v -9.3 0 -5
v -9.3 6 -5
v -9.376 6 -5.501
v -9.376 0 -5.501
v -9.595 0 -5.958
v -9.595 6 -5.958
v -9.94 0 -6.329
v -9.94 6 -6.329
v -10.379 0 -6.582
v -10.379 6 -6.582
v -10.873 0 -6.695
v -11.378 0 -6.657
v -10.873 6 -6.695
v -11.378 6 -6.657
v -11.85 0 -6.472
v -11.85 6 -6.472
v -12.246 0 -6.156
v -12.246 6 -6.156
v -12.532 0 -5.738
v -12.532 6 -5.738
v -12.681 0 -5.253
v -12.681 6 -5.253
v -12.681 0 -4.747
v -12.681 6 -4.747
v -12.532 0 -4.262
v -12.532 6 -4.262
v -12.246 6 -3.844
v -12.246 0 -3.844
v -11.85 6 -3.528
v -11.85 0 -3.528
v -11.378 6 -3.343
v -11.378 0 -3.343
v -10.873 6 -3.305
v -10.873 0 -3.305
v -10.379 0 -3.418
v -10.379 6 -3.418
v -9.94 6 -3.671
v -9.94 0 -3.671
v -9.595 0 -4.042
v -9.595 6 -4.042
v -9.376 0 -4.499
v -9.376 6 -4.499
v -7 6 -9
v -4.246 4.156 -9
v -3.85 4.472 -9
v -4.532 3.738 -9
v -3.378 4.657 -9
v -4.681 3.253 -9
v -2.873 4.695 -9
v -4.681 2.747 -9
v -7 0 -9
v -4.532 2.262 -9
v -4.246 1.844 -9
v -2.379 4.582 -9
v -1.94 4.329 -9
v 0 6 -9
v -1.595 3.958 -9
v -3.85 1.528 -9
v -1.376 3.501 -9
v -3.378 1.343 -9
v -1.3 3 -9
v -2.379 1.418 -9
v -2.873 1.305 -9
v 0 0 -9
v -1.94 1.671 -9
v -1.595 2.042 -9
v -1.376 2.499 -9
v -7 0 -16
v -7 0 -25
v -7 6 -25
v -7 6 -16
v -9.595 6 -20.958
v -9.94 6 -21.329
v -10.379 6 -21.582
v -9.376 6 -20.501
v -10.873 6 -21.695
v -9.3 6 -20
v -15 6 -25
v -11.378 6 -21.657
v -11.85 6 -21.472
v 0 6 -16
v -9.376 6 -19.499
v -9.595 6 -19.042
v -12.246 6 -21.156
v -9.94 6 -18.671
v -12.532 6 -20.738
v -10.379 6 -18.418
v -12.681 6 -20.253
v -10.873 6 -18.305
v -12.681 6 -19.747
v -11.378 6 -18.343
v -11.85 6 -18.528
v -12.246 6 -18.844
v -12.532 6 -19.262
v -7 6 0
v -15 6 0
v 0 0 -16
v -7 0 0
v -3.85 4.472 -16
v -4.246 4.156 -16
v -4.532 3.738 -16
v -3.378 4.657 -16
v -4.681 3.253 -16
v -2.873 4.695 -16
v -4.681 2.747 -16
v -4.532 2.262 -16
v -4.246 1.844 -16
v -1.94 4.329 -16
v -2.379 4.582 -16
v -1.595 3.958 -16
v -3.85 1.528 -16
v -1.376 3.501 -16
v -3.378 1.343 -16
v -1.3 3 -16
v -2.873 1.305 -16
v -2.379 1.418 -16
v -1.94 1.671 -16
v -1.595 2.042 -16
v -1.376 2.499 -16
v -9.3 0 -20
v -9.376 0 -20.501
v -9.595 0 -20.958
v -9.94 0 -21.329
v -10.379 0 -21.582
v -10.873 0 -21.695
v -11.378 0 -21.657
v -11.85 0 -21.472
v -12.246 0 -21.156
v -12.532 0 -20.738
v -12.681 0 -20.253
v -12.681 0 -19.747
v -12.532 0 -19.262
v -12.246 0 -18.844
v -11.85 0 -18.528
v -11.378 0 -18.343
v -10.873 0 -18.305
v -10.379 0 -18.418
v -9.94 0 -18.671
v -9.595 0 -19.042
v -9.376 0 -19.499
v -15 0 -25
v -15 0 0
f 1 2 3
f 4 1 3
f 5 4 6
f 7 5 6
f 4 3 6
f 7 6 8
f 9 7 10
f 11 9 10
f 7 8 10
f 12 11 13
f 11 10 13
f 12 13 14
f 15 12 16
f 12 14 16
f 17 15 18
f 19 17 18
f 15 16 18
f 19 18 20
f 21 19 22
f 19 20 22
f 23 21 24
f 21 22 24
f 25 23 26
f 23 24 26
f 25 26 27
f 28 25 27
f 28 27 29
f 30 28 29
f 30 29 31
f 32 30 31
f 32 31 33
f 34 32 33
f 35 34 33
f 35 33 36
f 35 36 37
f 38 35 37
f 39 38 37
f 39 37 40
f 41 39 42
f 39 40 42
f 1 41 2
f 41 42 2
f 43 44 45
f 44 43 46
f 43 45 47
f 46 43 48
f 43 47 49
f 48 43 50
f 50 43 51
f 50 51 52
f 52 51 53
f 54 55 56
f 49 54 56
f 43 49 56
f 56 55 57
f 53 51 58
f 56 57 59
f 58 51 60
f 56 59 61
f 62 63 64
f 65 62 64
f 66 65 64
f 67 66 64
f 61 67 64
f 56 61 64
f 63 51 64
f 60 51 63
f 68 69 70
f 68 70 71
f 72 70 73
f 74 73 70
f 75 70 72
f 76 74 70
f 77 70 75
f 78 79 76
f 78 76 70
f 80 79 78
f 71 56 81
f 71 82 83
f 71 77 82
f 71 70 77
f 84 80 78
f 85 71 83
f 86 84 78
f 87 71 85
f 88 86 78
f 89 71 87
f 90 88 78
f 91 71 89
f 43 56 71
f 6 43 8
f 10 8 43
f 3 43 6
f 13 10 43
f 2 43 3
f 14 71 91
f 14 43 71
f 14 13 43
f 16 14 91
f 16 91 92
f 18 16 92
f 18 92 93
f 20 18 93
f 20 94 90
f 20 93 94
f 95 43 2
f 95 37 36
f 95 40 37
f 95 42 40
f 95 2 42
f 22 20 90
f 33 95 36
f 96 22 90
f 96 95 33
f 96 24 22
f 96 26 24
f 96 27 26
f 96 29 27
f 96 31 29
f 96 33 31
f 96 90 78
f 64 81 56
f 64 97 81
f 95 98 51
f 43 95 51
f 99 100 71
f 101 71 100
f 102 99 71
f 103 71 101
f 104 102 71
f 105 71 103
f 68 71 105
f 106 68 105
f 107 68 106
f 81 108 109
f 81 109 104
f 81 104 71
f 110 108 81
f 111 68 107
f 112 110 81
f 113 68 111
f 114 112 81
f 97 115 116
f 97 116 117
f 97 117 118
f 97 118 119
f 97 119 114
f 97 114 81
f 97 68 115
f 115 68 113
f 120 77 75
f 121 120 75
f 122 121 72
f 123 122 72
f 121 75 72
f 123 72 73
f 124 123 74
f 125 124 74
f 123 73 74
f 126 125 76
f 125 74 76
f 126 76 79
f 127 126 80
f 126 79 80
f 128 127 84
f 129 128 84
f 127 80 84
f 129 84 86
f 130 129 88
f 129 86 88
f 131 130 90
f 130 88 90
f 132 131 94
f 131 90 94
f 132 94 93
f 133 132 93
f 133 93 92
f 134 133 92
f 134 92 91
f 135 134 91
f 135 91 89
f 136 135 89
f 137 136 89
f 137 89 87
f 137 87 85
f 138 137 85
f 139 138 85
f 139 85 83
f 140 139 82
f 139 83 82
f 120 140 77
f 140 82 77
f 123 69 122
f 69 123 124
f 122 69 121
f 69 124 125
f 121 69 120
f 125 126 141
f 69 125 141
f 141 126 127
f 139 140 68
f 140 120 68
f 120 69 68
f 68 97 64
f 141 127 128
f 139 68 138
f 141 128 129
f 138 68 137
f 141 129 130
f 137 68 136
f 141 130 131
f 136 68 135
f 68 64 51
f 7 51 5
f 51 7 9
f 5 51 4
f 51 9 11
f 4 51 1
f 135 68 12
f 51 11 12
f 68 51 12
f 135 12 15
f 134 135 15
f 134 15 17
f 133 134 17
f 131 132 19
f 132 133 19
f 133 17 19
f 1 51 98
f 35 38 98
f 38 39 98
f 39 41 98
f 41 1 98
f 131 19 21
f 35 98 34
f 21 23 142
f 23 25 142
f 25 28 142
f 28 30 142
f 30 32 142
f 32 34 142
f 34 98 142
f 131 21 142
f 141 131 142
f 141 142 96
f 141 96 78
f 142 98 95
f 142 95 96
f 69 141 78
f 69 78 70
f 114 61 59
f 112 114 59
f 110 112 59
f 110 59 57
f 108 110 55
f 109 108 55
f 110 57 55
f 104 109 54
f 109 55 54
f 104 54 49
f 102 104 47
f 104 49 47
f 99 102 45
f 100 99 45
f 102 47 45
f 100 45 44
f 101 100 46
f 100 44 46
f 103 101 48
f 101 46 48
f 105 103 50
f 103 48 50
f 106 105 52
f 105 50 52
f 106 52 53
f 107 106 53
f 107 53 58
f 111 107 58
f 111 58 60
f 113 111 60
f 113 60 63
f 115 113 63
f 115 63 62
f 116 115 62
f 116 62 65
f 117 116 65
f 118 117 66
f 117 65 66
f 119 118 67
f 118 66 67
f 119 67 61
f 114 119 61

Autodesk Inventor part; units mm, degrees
ref_plane "YZ Plane" through (0, 0, 0) normal (1, 0, 0) x (0, 1, 0)
ref_plane "XZ Plane" through (0, 0, 0) normal (0, 1, 0) x (-1, 0, 0)
ref_plane "XY Plane" through (0, 0, 0) normal (0, 0, 1) x (1, 0, 0)
sketch "Skizze1" plane through (0, 0, 0) normal (0, 1, 0) x (-1, 0, 0)
  line L0 (0, 0) -> (15, 0)
  line L1 (15, 0) -> (15, -25)
  line L2 (15, -25) -> (0, -25)
  line L3 (0, -25) -> (0, 0)
  dimension "d0" = 25
  dimension "d1" = 15
extrude "Extrusion1" add sketch "Skizze1" along normal blind 6
sketch "Skizze3" plane through (0, 0, -25) normal (0, 0, -1) x (-1, 0, 0)
  point P0 (0, 0)
sketch "Skizze6" plane through (0, 6, 0) normal (0, 1, 0) x (1, 0, 0)
  circle A0 centre (-11, 5) radius 1.7
  line L0 (-15, 25) -> (-15, 0) projected
  line L1 (-15, 0) -> (0, 0) projected
  circle A1 centre (-11, 20) radius 1.7
  line L2 (0, 25) -> (-15, 25) projected
  point P0 (0, 30)
  dimension "d11" = 3.4
  dimension "d12" = 4
  dimension "d13" = 5
  dimension "d14" = 3.4
  dimension "d15" = 4
  dimension "d16" = 5
extrude "Extrusion4" cut sketch "Skizze6" against normal blind 30
sketch "Skizze7" plane through (0, 0, 0) normal (0, -1, 0) x (1, 0, 0)
  line L0 (0, -25) -> (-15, -25) projected
  line L1 (0, -25) -> (-7, -25)
  line L2 (-7, -25) -> (-7, -16)
  line L3 (-7, -16) -> (0, -16)
  line L4 (0, -16) -> (0, -25)
  line L5 (-15, 0) -> (0, 0) projected
  line L6 (0, 0) -> (-7, 0)
  line L7 (-7, 0) -> (-7, -9)
  line L8 (-7, -9) -> (0, -9)
  line L9 (0, -9) -> (0, 0)
  dimension "d19" = 7
  dimension "d20" = 9
  dimension "d21" = 7
  dimension "d22" = 9
extrude "Extrusion5" cut sketch "Skizze7" against normal blind 30
sketch "Skizze8" plane through (-7, 0, -9) normal (0, 0, 1) x (1, 0, 0)
  circle A0 centre (4, 3) radius 1.7
  line L0 (7, 0) -> (0, 0) projected
  line L1 (7, 6) -> (7, 0) projected
  dimension "d25" = 3.4
  dimension "d26" = 3
  dimension "d27" = 3
extrude "Extrusion6" cut sketch "Skizze8" against normal blind 30
properties part number "kamera ut" material "CFK"
